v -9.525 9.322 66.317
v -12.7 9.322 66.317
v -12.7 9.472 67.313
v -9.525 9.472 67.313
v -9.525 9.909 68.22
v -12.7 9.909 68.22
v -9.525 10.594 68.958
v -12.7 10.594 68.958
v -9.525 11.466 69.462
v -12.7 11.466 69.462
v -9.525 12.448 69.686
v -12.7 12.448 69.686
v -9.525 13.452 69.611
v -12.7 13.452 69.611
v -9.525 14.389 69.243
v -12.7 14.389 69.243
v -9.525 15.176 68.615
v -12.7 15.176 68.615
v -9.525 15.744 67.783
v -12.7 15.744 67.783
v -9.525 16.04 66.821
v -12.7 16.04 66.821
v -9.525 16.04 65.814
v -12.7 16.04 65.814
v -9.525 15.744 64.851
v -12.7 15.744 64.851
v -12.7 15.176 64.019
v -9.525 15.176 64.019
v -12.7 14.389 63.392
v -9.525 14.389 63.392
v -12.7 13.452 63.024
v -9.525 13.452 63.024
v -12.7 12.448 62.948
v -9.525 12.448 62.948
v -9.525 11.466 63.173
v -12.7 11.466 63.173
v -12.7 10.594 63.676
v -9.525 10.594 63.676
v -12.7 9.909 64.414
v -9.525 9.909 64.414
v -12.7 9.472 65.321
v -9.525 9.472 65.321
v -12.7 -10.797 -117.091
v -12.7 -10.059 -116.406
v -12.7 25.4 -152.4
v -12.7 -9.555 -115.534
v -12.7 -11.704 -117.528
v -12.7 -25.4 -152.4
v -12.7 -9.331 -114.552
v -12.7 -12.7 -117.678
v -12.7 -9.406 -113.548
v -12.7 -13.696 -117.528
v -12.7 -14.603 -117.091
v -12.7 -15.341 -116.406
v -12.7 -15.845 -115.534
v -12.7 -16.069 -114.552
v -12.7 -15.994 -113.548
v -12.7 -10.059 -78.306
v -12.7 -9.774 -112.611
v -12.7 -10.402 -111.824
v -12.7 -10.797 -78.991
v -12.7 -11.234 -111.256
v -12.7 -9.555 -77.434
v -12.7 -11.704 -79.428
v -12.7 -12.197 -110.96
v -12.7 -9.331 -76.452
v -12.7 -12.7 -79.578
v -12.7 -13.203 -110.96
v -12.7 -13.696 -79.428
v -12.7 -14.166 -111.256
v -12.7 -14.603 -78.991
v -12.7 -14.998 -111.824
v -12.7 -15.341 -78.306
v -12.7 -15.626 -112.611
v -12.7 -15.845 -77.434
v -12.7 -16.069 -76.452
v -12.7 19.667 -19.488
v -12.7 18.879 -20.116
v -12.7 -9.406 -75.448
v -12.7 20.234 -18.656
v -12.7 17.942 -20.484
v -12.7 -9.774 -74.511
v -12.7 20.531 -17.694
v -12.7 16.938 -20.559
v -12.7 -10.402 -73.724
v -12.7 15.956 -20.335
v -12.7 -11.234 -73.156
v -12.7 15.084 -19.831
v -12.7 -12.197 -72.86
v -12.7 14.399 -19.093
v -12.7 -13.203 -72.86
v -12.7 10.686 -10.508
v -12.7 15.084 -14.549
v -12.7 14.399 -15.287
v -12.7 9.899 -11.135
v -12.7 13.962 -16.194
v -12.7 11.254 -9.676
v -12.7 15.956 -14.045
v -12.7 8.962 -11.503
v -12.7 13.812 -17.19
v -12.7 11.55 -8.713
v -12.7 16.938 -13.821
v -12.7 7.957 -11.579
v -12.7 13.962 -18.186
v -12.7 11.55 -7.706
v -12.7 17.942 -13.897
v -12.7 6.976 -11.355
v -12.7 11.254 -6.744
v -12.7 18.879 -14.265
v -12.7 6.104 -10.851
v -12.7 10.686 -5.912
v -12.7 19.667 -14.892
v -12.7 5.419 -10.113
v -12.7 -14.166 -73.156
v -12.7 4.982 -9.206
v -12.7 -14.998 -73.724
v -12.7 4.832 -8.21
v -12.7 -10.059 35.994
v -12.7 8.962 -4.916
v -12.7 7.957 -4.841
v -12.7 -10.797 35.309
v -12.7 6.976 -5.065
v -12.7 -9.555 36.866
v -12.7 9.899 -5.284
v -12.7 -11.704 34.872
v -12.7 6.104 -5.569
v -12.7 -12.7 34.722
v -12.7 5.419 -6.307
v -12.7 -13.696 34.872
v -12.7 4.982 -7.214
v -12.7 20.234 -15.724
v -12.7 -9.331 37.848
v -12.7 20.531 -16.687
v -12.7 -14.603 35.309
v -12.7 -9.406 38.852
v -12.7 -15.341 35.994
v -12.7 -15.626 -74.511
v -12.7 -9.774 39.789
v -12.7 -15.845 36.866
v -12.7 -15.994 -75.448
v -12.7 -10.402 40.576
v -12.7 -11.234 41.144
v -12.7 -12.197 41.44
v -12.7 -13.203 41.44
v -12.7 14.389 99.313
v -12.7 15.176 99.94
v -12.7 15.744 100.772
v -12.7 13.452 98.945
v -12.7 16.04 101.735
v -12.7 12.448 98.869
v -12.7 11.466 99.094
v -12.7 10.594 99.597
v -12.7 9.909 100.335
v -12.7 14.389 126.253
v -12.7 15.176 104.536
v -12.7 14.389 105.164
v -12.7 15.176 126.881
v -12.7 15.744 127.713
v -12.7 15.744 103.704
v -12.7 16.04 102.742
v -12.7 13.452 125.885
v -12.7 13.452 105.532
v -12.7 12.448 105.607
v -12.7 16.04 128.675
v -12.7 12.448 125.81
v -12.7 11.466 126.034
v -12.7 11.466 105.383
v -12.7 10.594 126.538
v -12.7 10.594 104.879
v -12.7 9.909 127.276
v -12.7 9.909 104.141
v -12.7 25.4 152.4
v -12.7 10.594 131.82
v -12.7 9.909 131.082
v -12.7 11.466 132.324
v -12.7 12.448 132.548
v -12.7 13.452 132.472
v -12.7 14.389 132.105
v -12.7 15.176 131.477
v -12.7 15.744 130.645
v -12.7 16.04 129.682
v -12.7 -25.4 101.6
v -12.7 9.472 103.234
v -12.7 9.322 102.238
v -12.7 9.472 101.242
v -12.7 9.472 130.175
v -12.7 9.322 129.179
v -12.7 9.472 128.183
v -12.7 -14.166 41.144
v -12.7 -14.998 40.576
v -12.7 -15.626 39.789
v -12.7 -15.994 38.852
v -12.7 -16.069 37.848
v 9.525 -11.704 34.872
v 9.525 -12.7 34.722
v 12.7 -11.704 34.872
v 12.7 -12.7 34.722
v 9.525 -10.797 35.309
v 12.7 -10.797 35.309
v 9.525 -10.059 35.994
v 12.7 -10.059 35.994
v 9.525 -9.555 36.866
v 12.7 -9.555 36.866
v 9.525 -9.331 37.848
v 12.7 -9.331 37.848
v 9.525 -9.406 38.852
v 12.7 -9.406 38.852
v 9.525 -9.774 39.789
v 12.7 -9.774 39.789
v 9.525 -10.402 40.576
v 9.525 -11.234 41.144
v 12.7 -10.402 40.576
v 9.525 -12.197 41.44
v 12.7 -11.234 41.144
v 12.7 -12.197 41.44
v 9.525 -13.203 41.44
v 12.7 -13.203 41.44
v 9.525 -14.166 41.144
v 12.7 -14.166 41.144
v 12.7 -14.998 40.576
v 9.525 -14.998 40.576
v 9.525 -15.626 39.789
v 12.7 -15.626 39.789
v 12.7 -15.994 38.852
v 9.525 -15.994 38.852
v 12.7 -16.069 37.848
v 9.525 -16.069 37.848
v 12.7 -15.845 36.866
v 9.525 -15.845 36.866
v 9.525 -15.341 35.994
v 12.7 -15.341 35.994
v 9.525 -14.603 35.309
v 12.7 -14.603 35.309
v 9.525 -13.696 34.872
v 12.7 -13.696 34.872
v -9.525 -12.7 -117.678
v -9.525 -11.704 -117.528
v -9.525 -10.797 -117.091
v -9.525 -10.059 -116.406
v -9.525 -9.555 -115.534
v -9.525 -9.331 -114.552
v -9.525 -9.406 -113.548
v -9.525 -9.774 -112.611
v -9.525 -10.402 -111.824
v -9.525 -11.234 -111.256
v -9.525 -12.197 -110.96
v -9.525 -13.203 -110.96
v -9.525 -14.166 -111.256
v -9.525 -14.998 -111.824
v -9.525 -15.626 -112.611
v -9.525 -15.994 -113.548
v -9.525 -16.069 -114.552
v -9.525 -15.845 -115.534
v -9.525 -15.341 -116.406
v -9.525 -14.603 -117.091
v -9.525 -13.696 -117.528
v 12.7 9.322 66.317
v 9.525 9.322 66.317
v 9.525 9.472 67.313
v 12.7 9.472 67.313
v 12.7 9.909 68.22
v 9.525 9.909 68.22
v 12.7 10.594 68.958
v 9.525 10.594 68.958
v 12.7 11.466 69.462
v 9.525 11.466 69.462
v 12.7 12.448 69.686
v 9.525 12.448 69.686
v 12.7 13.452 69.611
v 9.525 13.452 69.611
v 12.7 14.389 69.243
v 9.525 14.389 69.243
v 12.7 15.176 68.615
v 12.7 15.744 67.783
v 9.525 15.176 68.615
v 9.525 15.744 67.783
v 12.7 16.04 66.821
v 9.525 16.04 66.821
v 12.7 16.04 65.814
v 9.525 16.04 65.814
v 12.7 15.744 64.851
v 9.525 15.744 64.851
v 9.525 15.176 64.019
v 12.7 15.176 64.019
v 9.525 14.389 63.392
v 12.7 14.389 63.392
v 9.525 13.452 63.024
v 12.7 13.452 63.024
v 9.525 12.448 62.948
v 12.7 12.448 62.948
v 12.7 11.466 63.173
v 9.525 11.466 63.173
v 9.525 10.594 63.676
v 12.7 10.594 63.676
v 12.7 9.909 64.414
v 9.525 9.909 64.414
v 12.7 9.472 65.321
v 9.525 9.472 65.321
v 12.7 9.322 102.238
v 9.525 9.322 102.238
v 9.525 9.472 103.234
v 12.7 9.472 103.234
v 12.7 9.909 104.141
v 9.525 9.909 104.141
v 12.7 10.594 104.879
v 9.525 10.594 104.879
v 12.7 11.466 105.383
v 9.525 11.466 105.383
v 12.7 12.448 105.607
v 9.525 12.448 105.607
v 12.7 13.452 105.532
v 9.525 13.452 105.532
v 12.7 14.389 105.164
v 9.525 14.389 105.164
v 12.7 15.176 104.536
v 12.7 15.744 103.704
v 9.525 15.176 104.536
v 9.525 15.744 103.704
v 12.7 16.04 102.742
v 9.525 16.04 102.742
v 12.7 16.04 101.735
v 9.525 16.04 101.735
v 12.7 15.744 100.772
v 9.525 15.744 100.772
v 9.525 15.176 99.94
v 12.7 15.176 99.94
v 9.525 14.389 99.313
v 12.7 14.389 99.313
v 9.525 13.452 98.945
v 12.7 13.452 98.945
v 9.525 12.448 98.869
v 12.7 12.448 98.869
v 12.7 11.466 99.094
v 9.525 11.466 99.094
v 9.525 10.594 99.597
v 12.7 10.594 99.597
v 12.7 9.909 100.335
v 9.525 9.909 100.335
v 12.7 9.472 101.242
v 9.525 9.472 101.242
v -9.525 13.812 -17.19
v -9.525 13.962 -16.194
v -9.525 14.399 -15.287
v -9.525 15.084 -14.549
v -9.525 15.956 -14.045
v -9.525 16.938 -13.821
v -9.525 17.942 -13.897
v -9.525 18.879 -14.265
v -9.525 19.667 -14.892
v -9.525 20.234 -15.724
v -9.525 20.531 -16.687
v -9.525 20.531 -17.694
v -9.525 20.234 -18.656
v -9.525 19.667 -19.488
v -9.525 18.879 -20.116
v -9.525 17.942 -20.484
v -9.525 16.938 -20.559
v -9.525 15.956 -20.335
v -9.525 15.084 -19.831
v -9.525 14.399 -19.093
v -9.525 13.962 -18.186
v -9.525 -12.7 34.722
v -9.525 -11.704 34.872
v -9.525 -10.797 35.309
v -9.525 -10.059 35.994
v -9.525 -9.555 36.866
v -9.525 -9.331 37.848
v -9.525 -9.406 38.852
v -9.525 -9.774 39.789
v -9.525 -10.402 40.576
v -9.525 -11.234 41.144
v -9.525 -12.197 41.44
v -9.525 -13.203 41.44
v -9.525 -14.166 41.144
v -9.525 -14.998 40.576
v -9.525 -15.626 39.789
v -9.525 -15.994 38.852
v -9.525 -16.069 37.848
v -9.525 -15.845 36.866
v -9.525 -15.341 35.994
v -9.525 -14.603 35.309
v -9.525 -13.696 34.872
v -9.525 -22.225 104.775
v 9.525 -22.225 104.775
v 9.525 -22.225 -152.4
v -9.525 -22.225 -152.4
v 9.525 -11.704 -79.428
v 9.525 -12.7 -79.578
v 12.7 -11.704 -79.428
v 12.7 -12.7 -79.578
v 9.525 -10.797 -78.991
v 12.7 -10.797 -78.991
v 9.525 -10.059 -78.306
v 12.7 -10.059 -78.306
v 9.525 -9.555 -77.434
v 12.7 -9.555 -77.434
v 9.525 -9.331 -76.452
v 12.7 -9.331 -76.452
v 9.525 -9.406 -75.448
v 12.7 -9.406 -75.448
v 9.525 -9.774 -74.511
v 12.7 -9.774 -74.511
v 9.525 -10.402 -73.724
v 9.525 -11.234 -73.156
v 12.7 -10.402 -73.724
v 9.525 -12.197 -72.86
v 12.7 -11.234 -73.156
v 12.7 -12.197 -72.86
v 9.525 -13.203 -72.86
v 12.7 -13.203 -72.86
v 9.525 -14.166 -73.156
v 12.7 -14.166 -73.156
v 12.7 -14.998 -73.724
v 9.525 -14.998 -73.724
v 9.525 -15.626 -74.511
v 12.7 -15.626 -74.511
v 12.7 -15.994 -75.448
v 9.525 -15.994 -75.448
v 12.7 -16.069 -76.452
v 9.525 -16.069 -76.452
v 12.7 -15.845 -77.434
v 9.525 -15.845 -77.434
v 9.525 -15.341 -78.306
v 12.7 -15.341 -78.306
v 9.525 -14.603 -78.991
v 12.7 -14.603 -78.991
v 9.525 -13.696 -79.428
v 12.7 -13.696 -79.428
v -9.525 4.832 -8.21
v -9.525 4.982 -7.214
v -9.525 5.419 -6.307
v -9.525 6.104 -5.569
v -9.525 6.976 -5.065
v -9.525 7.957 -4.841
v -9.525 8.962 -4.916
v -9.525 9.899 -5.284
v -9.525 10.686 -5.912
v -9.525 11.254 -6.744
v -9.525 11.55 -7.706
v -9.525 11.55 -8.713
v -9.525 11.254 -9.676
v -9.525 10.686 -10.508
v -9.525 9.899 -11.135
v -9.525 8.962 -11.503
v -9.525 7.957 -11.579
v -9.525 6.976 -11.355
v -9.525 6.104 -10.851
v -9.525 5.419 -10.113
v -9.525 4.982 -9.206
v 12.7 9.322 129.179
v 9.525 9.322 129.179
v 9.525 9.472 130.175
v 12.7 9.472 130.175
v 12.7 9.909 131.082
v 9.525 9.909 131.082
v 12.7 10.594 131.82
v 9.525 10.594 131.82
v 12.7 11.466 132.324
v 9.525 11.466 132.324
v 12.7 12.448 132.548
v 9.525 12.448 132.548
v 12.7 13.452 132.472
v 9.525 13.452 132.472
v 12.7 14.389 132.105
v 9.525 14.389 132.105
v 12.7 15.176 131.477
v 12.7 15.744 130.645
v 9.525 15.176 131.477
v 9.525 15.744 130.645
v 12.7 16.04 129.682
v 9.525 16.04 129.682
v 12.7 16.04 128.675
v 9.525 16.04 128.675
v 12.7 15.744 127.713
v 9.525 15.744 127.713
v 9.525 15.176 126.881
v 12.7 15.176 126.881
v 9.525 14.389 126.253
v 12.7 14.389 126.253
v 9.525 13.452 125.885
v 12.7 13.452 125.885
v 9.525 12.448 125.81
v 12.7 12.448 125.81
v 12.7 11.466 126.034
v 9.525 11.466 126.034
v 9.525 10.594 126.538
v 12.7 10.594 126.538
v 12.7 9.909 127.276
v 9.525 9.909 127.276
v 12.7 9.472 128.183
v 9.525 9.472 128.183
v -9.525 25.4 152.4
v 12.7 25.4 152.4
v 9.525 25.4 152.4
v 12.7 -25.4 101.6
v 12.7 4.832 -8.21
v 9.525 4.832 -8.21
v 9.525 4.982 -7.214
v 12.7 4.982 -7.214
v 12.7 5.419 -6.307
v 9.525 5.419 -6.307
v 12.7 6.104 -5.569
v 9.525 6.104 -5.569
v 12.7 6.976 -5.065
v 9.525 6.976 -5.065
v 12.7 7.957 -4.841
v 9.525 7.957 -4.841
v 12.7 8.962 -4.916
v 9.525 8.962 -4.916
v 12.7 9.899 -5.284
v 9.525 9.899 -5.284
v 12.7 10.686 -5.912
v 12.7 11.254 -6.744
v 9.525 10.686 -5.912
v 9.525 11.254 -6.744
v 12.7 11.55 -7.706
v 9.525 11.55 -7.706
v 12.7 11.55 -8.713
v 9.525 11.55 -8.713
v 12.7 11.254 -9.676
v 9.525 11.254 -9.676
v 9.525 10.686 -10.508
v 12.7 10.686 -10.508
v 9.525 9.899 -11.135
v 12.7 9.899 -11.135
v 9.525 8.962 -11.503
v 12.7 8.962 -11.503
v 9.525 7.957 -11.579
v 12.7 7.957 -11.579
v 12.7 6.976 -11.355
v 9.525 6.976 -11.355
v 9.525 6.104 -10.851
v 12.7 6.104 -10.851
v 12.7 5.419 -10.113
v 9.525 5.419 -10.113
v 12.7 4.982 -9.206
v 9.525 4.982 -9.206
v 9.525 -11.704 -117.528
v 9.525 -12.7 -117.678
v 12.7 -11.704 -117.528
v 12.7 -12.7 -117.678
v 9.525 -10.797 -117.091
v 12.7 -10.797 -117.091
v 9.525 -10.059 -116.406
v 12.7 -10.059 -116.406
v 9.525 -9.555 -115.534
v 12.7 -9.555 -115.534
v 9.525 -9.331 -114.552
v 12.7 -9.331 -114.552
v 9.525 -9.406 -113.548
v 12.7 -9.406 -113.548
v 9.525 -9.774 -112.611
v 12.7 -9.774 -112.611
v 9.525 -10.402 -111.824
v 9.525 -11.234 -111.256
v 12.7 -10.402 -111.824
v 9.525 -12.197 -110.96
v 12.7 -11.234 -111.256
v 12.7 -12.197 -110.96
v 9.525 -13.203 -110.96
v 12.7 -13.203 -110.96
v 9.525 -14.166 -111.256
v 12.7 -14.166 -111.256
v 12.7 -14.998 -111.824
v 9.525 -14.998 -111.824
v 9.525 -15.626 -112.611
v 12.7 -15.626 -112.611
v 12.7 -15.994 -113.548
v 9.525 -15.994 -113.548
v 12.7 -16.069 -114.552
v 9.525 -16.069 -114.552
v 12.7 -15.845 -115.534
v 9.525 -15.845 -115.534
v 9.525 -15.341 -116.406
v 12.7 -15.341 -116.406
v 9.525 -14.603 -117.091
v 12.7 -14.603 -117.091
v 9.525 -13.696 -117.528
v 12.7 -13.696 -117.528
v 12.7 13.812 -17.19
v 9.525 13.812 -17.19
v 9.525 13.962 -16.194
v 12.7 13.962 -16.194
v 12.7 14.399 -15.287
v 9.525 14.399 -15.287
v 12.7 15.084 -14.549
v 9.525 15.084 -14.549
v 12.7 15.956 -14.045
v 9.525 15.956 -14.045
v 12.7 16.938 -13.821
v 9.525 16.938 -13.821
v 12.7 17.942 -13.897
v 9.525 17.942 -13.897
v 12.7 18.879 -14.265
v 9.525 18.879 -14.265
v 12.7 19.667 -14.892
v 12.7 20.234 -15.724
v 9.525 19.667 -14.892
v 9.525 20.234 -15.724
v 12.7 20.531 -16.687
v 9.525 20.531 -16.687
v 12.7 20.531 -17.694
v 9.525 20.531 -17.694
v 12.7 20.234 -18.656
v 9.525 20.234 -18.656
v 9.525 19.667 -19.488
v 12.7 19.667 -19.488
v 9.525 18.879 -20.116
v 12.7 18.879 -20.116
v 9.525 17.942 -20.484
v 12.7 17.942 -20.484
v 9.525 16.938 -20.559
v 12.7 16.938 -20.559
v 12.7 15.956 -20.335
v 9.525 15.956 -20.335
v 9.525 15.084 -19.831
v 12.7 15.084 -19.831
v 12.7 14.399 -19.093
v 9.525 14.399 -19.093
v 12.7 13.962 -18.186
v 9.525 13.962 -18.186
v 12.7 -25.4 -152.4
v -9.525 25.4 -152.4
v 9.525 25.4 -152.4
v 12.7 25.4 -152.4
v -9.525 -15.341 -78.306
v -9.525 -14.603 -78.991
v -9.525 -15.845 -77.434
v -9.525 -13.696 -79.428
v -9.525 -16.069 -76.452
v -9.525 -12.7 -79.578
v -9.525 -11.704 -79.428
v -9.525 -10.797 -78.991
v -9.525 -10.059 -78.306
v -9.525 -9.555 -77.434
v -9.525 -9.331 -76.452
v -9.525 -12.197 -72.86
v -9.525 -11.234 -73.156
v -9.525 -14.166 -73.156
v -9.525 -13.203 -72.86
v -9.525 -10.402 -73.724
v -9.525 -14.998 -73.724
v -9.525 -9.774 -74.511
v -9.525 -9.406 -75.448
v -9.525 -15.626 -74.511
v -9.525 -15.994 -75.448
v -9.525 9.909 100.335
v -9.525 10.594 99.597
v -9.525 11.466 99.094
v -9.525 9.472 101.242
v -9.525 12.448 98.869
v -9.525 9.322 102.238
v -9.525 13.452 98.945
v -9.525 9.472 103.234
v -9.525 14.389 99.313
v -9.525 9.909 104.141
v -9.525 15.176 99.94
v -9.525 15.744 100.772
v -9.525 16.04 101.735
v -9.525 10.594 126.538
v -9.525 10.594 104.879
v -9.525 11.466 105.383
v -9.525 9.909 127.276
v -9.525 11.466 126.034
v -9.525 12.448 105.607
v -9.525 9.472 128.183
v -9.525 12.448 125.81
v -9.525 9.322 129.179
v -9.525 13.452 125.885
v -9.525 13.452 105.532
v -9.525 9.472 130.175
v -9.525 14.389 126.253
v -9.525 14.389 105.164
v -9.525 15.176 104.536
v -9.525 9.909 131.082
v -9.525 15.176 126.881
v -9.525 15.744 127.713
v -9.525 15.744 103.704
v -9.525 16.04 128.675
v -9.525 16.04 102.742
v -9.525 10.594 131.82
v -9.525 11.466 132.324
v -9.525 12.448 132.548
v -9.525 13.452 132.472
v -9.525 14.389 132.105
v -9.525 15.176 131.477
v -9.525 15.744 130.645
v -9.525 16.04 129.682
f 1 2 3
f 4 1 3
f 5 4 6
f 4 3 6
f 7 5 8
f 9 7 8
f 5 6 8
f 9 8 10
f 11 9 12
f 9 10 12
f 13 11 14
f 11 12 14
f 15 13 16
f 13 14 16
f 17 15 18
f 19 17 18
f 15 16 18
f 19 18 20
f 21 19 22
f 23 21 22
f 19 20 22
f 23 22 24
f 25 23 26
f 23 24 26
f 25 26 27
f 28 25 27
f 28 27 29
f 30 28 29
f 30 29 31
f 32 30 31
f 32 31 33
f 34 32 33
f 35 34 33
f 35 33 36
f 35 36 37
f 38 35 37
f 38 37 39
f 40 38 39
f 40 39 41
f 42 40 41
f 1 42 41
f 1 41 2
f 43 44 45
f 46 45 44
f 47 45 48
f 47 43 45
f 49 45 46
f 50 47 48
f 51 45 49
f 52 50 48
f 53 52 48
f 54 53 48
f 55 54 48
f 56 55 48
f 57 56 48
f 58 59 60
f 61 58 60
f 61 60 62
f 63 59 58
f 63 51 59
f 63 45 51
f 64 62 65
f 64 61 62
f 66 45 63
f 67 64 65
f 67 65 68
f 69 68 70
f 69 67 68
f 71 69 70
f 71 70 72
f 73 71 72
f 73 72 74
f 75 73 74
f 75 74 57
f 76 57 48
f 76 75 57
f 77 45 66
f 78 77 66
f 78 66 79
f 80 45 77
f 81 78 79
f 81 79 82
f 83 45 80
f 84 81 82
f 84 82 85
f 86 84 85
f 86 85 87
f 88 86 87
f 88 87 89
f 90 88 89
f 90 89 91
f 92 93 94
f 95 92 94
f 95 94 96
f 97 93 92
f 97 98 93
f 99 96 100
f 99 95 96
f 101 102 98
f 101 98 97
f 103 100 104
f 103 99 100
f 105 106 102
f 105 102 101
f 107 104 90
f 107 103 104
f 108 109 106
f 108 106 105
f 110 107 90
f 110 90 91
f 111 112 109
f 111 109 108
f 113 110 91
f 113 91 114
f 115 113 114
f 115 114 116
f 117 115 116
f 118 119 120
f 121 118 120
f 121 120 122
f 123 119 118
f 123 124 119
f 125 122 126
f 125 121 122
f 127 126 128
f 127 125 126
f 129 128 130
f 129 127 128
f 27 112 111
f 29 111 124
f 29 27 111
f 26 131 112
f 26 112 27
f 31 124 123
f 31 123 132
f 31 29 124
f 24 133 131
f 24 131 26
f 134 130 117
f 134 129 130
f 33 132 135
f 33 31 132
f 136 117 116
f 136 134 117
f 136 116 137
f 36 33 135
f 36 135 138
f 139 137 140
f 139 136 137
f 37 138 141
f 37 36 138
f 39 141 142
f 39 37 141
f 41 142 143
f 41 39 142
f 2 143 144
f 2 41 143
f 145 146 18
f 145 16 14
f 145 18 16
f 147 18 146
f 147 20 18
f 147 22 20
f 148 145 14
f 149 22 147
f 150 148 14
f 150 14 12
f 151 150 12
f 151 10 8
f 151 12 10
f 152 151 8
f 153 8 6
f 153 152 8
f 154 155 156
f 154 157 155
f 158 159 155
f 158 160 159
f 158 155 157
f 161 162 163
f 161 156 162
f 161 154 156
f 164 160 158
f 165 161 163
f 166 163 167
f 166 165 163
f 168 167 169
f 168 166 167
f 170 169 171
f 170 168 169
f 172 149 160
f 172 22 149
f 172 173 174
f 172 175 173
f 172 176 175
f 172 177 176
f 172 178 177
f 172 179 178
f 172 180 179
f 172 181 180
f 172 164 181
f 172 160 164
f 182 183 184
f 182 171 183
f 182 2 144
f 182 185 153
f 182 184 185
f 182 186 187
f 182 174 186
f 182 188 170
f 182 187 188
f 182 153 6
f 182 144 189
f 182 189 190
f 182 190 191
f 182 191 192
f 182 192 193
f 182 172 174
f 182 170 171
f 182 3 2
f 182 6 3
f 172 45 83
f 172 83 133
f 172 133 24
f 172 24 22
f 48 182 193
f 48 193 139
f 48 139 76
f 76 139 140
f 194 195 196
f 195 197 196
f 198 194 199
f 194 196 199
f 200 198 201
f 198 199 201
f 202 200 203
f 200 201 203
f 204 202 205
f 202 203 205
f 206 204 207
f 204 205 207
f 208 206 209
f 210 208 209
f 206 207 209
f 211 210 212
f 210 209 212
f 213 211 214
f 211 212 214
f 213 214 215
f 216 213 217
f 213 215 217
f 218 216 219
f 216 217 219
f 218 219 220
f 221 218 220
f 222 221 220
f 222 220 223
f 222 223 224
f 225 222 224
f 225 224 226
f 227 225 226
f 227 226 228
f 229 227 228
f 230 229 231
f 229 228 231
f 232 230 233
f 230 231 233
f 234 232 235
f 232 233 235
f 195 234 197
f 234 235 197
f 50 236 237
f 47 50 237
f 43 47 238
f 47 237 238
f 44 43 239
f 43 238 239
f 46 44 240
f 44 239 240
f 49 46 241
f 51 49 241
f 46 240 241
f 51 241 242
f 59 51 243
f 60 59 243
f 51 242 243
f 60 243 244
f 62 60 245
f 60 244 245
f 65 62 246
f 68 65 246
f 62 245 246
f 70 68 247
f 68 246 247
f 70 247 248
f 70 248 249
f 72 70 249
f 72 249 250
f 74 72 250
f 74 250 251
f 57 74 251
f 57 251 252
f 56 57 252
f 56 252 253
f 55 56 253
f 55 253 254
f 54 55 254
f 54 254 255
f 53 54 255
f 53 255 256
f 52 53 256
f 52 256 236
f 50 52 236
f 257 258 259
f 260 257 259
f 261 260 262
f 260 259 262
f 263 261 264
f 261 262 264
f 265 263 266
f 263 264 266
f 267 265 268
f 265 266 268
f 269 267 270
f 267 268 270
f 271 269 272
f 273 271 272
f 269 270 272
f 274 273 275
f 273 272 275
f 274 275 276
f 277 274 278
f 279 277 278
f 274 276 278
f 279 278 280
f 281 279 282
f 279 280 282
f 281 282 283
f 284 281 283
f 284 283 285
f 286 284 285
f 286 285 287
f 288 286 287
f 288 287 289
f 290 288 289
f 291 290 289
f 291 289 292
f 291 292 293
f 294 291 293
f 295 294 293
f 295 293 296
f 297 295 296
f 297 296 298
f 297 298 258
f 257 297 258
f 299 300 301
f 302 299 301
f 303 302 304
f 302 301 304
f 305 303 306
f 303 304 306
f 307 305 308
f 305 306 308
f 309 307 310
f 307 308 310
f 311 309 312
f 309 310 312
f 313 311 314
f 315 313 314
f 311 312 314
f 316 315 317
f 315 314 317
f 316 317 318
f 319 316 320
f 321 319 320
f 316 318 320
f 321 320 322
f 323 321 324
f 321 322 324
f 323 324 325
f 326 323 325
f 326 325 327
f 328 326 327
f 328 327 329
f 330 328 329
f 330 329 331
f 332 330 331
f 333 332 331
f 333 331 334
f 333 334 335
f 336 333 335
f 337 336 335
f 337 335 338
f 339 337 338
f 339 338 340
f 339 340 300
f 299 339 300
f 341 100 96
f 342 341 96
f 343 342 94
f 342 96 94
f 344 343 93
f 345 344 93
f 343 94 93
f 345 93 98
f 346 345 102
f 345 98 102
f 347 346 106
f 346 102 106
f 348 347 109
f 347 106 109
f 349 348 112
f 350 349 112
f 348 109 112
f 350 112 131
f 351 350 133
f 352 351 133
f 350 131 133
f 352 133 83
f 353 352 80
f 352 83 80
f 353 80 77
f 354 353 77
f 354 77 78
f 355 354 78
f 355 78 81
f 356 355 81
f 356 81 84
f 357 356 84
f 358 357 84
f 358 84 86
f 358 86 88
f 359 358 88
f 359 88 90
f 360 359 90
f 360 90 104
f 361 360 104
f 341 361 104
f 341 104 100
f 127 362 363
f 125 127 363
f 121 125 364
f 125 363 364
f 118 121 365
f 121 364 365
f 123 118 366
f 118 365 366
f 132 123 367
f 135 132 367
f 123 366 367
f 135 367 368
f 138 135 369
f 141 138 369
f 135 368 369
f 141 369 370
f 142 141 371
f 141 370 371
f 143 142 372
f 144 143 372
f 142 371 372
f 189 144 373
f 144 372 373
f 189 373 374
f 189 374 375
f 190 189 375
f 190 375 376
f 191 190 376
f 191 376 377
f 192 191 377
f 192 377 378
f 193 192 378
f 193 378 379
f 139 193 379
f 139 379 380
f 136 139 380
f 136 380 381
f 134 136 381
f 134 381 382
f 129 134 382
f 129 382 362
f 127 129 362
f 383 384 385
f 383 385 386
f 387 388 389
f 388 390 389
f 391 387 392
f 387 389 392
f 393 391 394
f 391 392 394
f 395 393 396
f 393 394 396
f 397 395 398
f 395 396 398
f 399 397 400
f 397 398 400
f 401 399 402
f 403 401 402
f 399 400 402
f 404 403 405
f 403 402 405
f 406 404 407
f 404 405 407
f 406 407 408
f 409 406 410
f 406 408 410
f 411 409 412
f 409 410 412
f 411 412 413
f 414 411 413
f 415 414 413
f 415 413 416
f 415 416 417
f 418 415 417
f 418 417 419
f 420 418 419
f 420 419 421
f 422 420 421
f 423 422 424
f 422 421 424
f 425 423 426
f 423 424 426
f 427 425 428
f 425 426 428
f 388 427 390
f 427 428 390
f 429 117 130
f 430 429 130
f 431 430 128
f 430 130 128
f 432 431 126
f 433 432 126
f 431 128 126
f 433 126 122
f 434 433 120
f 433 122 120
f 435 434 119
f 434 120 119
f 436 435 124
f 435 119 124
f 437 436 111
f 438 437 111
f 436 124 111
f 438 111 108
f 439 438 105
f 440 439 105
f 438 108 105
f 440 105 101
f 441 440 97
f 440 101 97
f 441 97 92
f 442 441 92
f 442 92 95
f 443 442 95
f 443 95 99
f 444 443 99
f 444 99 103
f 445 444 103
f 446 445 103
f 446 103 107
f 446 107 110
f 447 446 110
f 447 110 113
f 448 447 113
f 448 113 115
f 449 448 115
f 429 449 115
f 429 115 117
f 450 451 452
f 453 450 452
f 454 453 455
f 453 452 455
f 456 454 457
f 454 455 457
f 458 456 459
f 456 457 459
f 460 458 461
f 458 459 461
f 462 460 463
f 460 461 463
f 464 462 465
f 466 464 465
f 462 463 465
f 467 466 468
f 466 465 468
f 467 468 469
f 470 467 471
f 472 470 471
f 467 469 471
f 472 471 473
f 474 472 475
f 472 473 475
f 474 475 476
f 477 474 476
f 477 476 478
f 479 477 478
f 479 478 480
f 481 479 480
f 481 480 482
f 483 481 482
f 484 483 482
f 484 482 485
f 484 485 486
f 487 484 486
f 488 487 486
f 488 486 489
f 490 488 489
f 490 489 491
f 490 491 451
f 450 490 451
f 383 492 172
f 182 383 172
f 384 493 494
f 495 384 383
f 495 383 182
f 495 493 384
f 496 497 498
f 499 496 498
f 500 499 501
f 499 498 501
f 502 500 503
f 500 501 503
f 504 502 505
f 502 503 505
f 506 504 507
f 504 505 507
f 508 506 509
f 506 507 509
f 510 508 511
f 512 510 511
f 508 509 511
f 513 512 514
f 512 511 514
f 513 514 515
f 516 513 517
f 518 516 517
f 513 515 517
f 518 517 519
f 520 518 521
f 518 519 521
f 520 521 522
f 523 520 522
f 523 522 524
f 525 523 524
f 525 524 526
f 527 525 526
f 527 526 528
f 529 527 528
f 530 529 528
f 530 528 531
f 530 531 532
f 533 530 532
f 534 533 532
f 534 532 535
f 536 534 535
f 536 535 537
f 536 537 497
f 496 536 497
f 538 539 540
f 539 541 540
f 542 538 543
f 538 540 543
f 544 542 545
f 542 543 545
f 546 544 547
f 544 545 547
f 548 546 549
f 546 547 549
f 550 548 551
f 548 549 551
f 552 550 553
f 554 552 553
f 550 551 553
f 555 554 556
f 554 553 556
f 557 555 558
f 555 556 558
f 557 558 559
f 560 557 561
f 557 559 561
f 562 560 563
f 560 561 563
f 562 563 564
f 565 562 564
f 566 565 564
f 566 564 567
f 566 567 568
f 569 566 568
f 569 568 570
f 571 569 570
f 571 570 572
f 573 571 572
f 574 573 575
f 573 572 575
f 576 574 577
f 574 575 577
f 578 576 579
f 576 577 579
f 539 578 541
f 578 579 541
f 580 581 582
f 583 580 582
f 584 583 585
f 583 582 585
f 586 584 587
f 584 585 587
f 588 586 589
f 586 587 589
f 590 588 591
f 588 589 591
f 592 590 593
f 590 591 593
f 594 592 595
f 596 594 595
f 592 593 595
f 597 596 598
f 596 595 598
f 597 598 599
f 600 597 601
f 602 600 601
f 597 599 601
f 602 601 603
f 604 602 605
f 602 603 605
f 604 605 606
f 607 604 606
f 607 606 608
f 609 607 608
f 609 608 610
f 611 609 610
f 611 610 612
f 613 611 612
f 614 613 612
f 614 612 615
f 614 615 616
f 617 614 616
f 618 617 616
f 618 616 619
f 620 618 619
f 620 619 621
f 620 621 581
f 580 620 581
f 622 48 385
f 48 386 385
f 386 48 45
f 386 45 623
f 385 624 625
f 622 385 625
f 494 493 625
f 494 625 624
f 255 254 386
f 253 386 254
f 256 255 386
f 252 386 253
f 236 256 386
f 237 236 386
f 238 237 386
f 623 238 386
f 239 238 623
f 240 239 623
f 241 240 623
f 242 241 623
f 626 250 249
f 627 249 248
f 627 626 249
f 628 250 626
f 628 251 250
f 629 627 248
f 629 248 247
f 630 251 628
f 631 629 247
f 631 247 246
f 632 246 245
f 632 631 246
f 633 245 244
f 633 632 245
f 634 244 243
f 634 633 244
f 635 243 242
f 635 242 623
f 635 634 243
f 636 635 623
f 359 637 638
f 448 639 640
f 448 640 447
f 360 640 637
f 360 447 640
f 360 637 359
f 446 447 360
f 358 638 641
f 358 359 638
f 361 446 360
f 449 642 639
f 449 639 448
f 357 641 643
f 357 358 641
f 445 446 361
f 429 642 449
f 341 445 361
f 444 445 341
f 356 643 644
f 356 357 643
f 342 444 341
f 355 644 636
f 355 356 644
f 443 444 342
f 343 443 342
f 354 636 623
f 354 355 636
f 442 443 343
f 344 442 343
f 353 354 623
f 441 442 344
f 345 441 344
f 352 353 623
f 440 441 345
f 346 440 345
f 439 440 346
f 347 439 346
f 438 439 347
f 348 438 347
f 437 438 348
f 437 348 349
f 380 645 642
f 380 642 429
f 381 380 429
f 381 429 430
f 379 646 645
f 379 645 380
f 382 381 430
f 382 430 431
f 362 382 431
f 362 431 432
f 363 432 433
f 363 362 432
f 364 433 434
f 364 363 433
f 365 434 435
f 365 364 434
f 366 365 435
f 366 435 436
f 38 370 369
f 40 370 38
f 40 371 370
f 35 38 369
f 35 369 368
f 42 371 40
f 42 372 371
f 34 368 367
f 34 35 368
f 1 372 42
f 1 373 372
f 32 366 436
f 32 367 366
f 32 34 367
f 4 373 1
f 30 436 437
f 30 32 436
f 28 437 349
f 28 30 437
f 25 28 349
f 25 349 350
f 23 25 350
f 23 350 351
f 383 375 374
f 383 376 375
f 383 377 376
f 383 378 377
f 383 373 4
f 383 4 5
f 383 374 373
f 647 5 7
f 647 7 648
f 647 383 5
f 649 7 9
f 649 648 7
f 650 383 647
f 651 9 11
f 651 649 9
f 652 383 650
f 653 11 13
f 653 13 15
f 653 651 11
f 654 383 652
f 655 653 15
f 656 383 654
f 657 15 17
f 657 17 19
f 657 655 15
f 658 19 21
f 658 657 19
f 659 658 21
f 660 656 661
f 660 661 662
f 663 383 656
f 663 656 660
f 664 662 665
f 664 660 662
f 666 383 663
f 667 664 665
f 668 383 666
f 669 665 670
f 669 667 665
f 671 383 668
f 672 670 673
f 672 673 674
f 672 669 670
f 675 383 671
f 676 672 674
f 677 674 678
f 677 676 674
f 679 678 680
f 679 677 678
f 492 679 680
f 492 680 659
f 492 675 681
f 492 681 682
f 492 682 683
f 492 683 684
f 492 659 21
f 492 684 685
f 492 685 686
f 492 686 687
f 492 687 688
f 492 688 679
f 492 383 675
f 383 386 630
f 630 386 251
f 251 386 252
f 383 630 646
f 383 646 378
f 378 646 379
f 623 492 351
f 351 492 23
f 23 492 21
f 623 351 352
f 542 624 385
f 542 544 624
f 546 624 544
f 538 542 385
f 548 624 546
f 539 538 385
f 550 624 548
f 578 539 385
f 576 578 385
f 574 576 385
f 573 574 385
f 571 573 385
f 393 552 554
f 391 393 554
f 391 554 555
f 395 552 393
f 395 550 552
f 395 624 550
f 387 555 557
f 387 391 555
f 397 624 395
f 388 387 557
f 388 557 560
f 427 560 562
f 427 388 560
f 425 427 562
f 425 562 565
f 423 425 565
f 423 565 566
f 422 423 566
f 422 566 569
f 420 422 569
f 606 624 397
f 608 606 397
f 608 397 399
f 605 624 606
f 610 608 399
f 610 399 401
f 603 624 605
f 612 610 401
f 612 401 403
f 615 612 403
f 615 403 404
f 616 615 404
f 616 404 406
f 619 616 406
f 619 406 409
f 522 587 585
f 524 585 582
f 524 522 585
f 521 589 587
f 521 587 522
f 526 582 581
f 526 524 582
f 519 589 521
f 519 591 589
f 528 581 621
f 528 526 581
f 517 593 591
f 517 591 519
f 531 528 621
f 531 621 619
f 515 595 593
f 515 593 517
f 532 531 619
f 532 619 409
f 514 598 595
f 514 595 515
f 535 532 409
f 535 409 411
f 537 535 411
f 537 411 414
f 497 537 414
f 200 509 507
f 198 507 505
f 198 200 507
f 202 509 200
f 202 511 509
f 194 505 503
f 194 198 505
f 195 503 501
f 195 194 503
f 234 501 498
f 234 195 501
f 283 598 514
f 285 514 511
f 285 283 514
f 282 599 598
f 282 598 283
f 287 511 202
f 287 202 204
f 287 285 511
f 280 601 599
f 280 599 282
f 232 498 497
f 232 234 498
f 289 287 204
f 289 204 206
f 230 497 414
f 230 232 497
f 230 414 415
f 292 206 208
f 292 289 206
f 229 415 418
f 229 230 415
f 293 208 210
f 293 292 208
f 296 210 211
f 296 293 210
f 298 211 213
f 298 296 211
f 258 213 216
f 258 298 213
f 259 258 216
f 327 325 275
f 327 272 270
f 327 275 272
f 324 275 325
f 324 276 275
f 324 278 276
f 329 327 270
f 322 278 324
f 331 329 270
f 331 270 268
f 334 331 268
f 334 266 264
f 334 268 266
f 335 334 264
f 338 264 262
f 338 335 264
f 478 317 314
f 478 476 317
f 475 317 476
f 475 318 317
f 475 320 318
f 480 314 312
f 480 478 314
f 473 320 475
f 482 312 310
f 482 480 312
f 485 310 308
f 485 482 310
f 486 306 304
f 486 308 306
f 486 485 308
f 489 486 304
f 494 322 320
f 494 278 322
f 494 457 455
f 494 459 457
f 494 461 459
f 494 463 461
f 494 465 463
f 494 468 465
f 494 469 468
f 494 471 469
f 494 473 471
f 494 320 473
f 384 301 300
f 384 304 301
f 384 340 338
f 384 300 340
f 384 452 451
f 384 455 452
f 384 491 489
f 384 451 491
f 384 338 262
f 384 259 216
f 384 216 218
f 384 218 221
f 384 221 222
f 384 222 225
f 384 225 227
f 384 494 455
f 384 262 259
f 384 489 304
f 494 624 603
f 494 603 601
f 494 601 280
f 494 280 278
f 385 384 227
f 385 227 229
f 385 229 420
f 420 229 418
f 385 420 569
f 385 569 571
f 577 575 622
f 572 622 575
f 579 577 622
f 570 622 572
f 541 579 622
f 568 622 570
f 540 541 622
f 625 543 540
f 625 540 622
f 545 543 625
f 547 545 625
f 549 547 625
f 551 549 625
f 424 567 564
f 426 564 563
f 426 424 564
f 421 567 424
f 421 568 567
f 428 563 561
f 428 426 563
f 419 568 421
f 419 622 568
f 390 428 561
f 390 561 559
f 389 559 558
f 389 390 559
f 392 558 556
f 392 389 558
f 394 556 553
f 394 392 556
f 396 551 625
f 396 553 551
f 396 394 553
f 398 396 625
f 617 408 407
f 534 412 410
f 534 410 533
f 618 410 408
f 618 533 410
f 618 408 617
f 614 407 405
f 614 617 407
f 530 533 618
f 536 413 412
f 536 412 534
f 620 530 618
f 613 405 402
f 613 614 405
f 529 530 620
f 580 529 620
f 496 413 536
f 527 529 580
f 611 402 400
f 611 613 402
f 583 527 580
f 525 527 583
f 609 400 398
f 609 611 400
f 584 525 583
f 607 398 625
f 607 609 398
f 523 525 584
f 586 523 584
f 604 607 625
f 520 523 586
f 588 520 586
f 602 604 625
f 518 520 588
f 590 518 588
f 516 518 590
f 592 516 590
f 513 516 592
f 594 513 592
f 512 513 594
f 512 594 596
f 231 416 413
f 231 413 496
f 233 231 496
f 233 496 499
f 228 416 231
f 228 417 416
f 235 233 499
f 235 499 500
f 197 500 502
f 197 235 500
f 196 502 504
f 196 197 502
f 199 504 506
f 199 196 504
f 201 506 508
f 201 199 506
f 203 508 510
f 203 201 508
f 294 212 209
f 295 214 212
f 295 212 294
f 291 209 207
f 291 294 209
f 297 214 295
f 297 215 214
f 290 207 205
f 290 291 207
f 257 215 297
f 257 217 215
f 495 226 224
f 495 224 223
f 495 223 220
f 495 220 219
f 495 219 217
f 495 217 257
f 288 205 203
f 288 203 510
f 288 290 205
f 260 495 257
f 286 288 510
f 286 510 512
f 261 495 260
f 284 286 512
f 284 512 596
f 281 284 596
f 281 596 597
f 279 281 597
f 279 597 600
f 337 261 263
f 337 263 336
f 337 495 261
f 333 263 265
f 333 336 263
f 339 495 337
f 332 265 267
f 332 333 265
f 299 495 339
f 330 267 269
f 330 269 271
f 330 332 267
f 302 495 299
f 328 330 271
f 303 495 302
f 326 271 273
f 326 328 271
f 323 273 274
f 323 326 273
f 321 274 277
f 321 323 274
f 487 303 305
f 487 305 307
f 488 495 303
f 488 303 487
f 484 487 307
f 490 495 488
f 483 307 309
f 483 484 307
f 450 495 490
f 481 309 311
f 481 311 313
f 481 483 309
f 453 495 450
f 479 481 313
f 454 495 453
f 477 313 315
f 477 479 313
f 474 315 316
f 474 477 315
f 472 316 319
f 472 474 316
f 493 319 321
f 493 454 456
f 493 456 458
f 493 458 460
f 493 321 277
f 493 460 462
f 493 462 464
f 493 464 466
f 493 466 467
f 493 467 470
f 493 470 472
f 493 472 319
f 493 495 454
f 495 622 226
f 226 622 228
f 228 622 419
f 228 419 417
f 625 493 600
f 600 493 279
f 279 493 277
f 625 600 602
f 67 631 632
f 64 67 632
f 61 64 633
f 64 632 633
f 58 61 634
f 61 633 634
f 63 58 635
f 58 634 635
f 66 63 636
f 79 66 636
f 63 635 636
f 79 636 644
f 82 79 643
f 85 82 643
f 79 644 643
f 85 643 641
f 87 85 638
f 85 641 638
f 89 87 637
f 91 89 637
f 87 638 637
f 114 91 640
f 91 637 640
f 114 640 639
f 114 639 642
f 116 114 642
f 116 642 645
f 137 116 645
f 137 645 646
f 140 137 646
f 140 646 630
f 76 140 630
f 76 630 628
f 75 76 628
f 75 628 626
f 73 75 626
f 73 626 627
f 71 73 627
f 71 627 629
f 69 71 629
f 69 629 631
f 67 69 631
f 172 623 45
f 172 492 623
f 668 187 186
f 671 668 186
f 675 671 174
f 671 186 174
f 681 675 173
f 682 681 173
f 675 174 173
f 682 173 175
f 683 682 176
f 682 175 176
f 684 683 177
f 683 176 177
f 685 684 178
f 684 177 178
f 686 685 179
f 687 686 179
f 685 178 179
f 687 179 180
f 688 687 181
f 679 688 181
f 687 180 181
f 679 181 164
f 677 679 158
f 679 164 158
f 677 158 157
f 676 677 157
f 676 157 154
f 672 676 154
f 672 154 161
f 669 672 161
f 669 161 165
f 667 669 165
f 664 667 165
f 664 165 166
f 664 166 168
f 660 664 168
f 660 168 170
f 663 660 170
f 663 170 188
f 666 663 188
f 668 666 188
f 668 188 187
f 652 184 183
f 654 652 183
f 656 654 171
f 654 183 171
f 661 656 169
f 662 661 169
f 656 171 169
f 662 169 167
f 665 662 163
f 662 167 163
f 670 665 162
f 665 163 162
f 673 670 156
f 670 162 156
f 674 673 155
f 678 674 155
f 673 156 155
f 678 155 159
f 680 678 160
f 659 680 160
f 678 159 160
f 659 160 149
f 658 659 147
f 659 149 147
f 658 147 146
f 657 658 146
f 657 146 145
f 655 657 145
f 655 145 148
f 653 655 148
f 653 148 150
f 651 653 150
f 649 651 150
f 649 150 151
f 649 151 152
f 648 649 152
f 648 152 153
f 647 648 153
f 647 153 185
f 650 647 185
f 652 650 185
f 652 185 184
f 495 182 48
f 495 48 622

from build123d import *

# Parameters (mm, degrees)
BOSS_EXTRUDE2_DEPTH         = 152.4
CUT_EXTRUDE1_DEPTH          = 157.576115675
SKETCH5_R                   = 3.3782
CUT_EXTRUDE2_DEPTH          = 157.576115675
CUT_EXTRUDE3_REACH          = 158.576
SKETCH10_R                  = 3.3782
F_1_4_CLEARANCE_HOLE1_D     = 6.7564
F_1_4_CLEARANCE_HOLE1_DEPTH = 25.4
F_1_4_CLEARANCE_HOLE1_TIP   = 2.029827343


with BuildPart() as part:
    # Sketch3 → Boss-Extrude2 (new, symmetric)
    with BuildSketch(Plane.XY):
        Polygon((-12.7, 25.4), (-12.7, -25.4), (12.7, -25.4), (12.7, 25.4), (9.525, 25.4), (9.525, -22.225), (-9.525, -22.225), (-9.525, 25.4), align=None)
    extrude(amount=BOSS_EXTRUDE2_DEPTH, both=True)

    # Sketch4 → Cut-Extrude1 (cut, through all)
    with BuildSketch(Plane(origin=(12.7, 0, 0), x_dir=(0, 0, -1), z_dir=(1, 0, 0))):
        Polygon((-152.4, 25.4), (-101.6, -25.4), (-152.4, -25.4), align=None)
    extrude(amount=-CUT_EXTRUDE1_DEPTH, mode=Mode.SUBTRACT)

    # Sketch5 → Cut-Extrude2 (cut, through all)
    with BuildSketch(Plane.ZY.offset(12.7)):
        with Locations(Location((-8.209871939, 8.209871939, 0), (0, 0, 270))):
            Circle(SKETCH5_R)
        with Locations(Location((-17.190128061, 17.190128061, 0), (0, 0, 270))):
            Circle(SKETCH5_R)
    extrude(amount=-CUT_EXTRUDE2_DEPTH, mode=Mode.SUBTRACT)

    # Cut-Extrude3: up to this face of the body (flat: up to its plane)
    cut_extrude3_end = Plane(part.part.faces().sort_by_distance((12.7, 0.709119442, -12.313197401))[0])
    # Sketch10 → Cut-Extrude3 (cut, up to the picked face)
    with BuildSketch(Plane.ZY.offset(12.7), mode=Mode.PRIVATE) as cut_extrude3_sk1:
        with Locations(Location((66.317182668, 12.7, 0), (0, 0, 270))):
            Circle(SKETCH10_R)
    cut_extrude3_tool1 = split(extrude(cut_extrude3_sk1.sketch, amount=-CUT_EXTRUDE3_REACH, mode=Mode.PRIVATE), bisect_by=cut_extrude3_end, keep=Keep.BOTH, mode=Mode.PRIVATE)
    # Sketch10 → Cut-Extrude3 (cut, up to the picked face)
    with BuildSketch(Plane.ZY.offset(12.7), mode=Mode.PRIVATE) as cut_extrude3_sk2:
        with Locations(Location((129.178975516, 12.7, 0), (0, 0, 270))):
            Circle(SKETCH10_R)
    cut_extrude3_tool2 = split(extrude(cut_extrude3_sk2.sketch, amount=-CUT_EXTRUDE3_REACH, mode=Mode.PRIVATE), bisect_by=cut_extrude3_end, keep=Keep.BOTH, mode=Mode.PRIVATE)
    # Sketch10 → Cut-Extrude3 (cut, up to the picked face)
    with BuildSketch(Plane.ZY.offset(12.7), mode=Mode.PRIVATE) as cut_extrude3_sk3:
        with Locations(Location((102.238207153, 12.7, 0), (0, 0, 270))):
            Circle(SKETCH10_R)
    cut_extrude3_tool3 = split(extrude(cut_extrude3_sk3.sketch, amount=-CUT_EXTRUDE3_REACH, mode=Mode.PRIVATE), bisect_by=cut_extrude3_end, keep=Keep.BOTH, mode=Mode.PRIVATE)
    add(cut_extrude3_tool1.solids().sort_by(Axis((-12.7, 12.7, 66.317183), (1, 0, 0)))[0], mode=Mode.SUBTRACT)
    add(cut_extrude3_tool2.solids().sort_by(Axis((-12.7, 12.7, 129.178976), (1, 0, 0)))[0], mode=Mode.SUBTRACT)
    add(cut_extrude3_tool3.solids().sort_by(Axis((-12.7, 12.7, 102.238207), (1, 0, 0)))[0], mode=Mode.SUBTRACT)

    # 1/4 Clearance Hole1
    with Locations(Plane.ZY.offset(12.7)):
        with Locations((38.1, -12.7), (-114.3, -12.7), (-76.2, -12.7)):
            Hole(F_1_4_CLEARANCE_HOLE1_D / 2, depth=F_1_4_CLEARANCE_HOLE1_DEPTH)
            with Locations((0, 0, -(F_1_4_CLEARANCE_HOLE1_DEPTH + F_1_4_CLEARANCE_HOLE1_TIP / 2))):  # 118° drill point
                Cone(0, F_1_4_CLEARANCE_HOLE1_D / 2, F_1_4_CLEARANCE_HOLE1_TIP, mode=Mode.SUBTRACT)


solid = part.part
